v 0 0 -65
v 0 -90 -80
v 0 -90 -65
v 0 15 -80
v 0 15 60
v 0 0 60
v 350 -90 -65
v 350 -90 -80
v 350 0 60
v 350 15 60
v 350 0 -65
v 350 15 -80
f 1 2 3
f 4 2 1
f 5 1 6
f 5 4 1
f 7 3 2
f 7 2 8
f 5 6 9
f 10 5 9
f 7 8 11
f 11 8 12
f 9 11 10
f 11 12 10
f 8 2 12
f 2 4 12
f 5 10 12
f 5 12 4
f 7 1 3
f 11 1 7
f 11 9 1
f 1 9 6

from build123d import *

# Parameters (mm, degrees)
SKETCH1_W           = 350
SKETCH1_H           = 60
BOSS_EXTRUDE1_DEPTH = 15
SKETCH3_W           = 350
SKETCH3_H           = 15
BOSS_EXTRUDE4_DEPTH = 80
SKETCH5_W           = 350
SKETCH5_H           = 15
BOSS_EXTRUDE5_DEPTH = 90


with BuildPart() as part:
    # Sketch1 → Boss-Extrude1 (new body)
    with BuildSketch(Plane(origin=(0, 0, 0), x_dir=(1, 0, 0), z_dir=(0, 1, 0))):
        with Locations((175, -30)):
            Rectangle(SKETCH1_W, SKETCH1_H)
    extrude(amount=BOSS_EXTRUDE1_DEPTH)

    # Sketch3 → Boss-Extrude4 (add)
    with BuildSketch(Plane(origin=(0, 0, 0), x_dir=(-1, 0, 0), z_dir=(0, 0, -1))):
        with Locations((-175, 7.5)):
            Rectangle(SKETCH3_W, SKETCH3_H)
    extrude(amount=BOSS_EXTRUDE4_DEPTH)

    # Sketch5 → Boss-Extrude5 (add)
    with BuildSketch(Plane.XZ):
        with Locations((175, -72.5)):
            Rectangle(SKETCH5_W, SKETCH5_H)
    extrude(amount=BOSS_EXTRUDE5_DEPTH)


solid = part.part
